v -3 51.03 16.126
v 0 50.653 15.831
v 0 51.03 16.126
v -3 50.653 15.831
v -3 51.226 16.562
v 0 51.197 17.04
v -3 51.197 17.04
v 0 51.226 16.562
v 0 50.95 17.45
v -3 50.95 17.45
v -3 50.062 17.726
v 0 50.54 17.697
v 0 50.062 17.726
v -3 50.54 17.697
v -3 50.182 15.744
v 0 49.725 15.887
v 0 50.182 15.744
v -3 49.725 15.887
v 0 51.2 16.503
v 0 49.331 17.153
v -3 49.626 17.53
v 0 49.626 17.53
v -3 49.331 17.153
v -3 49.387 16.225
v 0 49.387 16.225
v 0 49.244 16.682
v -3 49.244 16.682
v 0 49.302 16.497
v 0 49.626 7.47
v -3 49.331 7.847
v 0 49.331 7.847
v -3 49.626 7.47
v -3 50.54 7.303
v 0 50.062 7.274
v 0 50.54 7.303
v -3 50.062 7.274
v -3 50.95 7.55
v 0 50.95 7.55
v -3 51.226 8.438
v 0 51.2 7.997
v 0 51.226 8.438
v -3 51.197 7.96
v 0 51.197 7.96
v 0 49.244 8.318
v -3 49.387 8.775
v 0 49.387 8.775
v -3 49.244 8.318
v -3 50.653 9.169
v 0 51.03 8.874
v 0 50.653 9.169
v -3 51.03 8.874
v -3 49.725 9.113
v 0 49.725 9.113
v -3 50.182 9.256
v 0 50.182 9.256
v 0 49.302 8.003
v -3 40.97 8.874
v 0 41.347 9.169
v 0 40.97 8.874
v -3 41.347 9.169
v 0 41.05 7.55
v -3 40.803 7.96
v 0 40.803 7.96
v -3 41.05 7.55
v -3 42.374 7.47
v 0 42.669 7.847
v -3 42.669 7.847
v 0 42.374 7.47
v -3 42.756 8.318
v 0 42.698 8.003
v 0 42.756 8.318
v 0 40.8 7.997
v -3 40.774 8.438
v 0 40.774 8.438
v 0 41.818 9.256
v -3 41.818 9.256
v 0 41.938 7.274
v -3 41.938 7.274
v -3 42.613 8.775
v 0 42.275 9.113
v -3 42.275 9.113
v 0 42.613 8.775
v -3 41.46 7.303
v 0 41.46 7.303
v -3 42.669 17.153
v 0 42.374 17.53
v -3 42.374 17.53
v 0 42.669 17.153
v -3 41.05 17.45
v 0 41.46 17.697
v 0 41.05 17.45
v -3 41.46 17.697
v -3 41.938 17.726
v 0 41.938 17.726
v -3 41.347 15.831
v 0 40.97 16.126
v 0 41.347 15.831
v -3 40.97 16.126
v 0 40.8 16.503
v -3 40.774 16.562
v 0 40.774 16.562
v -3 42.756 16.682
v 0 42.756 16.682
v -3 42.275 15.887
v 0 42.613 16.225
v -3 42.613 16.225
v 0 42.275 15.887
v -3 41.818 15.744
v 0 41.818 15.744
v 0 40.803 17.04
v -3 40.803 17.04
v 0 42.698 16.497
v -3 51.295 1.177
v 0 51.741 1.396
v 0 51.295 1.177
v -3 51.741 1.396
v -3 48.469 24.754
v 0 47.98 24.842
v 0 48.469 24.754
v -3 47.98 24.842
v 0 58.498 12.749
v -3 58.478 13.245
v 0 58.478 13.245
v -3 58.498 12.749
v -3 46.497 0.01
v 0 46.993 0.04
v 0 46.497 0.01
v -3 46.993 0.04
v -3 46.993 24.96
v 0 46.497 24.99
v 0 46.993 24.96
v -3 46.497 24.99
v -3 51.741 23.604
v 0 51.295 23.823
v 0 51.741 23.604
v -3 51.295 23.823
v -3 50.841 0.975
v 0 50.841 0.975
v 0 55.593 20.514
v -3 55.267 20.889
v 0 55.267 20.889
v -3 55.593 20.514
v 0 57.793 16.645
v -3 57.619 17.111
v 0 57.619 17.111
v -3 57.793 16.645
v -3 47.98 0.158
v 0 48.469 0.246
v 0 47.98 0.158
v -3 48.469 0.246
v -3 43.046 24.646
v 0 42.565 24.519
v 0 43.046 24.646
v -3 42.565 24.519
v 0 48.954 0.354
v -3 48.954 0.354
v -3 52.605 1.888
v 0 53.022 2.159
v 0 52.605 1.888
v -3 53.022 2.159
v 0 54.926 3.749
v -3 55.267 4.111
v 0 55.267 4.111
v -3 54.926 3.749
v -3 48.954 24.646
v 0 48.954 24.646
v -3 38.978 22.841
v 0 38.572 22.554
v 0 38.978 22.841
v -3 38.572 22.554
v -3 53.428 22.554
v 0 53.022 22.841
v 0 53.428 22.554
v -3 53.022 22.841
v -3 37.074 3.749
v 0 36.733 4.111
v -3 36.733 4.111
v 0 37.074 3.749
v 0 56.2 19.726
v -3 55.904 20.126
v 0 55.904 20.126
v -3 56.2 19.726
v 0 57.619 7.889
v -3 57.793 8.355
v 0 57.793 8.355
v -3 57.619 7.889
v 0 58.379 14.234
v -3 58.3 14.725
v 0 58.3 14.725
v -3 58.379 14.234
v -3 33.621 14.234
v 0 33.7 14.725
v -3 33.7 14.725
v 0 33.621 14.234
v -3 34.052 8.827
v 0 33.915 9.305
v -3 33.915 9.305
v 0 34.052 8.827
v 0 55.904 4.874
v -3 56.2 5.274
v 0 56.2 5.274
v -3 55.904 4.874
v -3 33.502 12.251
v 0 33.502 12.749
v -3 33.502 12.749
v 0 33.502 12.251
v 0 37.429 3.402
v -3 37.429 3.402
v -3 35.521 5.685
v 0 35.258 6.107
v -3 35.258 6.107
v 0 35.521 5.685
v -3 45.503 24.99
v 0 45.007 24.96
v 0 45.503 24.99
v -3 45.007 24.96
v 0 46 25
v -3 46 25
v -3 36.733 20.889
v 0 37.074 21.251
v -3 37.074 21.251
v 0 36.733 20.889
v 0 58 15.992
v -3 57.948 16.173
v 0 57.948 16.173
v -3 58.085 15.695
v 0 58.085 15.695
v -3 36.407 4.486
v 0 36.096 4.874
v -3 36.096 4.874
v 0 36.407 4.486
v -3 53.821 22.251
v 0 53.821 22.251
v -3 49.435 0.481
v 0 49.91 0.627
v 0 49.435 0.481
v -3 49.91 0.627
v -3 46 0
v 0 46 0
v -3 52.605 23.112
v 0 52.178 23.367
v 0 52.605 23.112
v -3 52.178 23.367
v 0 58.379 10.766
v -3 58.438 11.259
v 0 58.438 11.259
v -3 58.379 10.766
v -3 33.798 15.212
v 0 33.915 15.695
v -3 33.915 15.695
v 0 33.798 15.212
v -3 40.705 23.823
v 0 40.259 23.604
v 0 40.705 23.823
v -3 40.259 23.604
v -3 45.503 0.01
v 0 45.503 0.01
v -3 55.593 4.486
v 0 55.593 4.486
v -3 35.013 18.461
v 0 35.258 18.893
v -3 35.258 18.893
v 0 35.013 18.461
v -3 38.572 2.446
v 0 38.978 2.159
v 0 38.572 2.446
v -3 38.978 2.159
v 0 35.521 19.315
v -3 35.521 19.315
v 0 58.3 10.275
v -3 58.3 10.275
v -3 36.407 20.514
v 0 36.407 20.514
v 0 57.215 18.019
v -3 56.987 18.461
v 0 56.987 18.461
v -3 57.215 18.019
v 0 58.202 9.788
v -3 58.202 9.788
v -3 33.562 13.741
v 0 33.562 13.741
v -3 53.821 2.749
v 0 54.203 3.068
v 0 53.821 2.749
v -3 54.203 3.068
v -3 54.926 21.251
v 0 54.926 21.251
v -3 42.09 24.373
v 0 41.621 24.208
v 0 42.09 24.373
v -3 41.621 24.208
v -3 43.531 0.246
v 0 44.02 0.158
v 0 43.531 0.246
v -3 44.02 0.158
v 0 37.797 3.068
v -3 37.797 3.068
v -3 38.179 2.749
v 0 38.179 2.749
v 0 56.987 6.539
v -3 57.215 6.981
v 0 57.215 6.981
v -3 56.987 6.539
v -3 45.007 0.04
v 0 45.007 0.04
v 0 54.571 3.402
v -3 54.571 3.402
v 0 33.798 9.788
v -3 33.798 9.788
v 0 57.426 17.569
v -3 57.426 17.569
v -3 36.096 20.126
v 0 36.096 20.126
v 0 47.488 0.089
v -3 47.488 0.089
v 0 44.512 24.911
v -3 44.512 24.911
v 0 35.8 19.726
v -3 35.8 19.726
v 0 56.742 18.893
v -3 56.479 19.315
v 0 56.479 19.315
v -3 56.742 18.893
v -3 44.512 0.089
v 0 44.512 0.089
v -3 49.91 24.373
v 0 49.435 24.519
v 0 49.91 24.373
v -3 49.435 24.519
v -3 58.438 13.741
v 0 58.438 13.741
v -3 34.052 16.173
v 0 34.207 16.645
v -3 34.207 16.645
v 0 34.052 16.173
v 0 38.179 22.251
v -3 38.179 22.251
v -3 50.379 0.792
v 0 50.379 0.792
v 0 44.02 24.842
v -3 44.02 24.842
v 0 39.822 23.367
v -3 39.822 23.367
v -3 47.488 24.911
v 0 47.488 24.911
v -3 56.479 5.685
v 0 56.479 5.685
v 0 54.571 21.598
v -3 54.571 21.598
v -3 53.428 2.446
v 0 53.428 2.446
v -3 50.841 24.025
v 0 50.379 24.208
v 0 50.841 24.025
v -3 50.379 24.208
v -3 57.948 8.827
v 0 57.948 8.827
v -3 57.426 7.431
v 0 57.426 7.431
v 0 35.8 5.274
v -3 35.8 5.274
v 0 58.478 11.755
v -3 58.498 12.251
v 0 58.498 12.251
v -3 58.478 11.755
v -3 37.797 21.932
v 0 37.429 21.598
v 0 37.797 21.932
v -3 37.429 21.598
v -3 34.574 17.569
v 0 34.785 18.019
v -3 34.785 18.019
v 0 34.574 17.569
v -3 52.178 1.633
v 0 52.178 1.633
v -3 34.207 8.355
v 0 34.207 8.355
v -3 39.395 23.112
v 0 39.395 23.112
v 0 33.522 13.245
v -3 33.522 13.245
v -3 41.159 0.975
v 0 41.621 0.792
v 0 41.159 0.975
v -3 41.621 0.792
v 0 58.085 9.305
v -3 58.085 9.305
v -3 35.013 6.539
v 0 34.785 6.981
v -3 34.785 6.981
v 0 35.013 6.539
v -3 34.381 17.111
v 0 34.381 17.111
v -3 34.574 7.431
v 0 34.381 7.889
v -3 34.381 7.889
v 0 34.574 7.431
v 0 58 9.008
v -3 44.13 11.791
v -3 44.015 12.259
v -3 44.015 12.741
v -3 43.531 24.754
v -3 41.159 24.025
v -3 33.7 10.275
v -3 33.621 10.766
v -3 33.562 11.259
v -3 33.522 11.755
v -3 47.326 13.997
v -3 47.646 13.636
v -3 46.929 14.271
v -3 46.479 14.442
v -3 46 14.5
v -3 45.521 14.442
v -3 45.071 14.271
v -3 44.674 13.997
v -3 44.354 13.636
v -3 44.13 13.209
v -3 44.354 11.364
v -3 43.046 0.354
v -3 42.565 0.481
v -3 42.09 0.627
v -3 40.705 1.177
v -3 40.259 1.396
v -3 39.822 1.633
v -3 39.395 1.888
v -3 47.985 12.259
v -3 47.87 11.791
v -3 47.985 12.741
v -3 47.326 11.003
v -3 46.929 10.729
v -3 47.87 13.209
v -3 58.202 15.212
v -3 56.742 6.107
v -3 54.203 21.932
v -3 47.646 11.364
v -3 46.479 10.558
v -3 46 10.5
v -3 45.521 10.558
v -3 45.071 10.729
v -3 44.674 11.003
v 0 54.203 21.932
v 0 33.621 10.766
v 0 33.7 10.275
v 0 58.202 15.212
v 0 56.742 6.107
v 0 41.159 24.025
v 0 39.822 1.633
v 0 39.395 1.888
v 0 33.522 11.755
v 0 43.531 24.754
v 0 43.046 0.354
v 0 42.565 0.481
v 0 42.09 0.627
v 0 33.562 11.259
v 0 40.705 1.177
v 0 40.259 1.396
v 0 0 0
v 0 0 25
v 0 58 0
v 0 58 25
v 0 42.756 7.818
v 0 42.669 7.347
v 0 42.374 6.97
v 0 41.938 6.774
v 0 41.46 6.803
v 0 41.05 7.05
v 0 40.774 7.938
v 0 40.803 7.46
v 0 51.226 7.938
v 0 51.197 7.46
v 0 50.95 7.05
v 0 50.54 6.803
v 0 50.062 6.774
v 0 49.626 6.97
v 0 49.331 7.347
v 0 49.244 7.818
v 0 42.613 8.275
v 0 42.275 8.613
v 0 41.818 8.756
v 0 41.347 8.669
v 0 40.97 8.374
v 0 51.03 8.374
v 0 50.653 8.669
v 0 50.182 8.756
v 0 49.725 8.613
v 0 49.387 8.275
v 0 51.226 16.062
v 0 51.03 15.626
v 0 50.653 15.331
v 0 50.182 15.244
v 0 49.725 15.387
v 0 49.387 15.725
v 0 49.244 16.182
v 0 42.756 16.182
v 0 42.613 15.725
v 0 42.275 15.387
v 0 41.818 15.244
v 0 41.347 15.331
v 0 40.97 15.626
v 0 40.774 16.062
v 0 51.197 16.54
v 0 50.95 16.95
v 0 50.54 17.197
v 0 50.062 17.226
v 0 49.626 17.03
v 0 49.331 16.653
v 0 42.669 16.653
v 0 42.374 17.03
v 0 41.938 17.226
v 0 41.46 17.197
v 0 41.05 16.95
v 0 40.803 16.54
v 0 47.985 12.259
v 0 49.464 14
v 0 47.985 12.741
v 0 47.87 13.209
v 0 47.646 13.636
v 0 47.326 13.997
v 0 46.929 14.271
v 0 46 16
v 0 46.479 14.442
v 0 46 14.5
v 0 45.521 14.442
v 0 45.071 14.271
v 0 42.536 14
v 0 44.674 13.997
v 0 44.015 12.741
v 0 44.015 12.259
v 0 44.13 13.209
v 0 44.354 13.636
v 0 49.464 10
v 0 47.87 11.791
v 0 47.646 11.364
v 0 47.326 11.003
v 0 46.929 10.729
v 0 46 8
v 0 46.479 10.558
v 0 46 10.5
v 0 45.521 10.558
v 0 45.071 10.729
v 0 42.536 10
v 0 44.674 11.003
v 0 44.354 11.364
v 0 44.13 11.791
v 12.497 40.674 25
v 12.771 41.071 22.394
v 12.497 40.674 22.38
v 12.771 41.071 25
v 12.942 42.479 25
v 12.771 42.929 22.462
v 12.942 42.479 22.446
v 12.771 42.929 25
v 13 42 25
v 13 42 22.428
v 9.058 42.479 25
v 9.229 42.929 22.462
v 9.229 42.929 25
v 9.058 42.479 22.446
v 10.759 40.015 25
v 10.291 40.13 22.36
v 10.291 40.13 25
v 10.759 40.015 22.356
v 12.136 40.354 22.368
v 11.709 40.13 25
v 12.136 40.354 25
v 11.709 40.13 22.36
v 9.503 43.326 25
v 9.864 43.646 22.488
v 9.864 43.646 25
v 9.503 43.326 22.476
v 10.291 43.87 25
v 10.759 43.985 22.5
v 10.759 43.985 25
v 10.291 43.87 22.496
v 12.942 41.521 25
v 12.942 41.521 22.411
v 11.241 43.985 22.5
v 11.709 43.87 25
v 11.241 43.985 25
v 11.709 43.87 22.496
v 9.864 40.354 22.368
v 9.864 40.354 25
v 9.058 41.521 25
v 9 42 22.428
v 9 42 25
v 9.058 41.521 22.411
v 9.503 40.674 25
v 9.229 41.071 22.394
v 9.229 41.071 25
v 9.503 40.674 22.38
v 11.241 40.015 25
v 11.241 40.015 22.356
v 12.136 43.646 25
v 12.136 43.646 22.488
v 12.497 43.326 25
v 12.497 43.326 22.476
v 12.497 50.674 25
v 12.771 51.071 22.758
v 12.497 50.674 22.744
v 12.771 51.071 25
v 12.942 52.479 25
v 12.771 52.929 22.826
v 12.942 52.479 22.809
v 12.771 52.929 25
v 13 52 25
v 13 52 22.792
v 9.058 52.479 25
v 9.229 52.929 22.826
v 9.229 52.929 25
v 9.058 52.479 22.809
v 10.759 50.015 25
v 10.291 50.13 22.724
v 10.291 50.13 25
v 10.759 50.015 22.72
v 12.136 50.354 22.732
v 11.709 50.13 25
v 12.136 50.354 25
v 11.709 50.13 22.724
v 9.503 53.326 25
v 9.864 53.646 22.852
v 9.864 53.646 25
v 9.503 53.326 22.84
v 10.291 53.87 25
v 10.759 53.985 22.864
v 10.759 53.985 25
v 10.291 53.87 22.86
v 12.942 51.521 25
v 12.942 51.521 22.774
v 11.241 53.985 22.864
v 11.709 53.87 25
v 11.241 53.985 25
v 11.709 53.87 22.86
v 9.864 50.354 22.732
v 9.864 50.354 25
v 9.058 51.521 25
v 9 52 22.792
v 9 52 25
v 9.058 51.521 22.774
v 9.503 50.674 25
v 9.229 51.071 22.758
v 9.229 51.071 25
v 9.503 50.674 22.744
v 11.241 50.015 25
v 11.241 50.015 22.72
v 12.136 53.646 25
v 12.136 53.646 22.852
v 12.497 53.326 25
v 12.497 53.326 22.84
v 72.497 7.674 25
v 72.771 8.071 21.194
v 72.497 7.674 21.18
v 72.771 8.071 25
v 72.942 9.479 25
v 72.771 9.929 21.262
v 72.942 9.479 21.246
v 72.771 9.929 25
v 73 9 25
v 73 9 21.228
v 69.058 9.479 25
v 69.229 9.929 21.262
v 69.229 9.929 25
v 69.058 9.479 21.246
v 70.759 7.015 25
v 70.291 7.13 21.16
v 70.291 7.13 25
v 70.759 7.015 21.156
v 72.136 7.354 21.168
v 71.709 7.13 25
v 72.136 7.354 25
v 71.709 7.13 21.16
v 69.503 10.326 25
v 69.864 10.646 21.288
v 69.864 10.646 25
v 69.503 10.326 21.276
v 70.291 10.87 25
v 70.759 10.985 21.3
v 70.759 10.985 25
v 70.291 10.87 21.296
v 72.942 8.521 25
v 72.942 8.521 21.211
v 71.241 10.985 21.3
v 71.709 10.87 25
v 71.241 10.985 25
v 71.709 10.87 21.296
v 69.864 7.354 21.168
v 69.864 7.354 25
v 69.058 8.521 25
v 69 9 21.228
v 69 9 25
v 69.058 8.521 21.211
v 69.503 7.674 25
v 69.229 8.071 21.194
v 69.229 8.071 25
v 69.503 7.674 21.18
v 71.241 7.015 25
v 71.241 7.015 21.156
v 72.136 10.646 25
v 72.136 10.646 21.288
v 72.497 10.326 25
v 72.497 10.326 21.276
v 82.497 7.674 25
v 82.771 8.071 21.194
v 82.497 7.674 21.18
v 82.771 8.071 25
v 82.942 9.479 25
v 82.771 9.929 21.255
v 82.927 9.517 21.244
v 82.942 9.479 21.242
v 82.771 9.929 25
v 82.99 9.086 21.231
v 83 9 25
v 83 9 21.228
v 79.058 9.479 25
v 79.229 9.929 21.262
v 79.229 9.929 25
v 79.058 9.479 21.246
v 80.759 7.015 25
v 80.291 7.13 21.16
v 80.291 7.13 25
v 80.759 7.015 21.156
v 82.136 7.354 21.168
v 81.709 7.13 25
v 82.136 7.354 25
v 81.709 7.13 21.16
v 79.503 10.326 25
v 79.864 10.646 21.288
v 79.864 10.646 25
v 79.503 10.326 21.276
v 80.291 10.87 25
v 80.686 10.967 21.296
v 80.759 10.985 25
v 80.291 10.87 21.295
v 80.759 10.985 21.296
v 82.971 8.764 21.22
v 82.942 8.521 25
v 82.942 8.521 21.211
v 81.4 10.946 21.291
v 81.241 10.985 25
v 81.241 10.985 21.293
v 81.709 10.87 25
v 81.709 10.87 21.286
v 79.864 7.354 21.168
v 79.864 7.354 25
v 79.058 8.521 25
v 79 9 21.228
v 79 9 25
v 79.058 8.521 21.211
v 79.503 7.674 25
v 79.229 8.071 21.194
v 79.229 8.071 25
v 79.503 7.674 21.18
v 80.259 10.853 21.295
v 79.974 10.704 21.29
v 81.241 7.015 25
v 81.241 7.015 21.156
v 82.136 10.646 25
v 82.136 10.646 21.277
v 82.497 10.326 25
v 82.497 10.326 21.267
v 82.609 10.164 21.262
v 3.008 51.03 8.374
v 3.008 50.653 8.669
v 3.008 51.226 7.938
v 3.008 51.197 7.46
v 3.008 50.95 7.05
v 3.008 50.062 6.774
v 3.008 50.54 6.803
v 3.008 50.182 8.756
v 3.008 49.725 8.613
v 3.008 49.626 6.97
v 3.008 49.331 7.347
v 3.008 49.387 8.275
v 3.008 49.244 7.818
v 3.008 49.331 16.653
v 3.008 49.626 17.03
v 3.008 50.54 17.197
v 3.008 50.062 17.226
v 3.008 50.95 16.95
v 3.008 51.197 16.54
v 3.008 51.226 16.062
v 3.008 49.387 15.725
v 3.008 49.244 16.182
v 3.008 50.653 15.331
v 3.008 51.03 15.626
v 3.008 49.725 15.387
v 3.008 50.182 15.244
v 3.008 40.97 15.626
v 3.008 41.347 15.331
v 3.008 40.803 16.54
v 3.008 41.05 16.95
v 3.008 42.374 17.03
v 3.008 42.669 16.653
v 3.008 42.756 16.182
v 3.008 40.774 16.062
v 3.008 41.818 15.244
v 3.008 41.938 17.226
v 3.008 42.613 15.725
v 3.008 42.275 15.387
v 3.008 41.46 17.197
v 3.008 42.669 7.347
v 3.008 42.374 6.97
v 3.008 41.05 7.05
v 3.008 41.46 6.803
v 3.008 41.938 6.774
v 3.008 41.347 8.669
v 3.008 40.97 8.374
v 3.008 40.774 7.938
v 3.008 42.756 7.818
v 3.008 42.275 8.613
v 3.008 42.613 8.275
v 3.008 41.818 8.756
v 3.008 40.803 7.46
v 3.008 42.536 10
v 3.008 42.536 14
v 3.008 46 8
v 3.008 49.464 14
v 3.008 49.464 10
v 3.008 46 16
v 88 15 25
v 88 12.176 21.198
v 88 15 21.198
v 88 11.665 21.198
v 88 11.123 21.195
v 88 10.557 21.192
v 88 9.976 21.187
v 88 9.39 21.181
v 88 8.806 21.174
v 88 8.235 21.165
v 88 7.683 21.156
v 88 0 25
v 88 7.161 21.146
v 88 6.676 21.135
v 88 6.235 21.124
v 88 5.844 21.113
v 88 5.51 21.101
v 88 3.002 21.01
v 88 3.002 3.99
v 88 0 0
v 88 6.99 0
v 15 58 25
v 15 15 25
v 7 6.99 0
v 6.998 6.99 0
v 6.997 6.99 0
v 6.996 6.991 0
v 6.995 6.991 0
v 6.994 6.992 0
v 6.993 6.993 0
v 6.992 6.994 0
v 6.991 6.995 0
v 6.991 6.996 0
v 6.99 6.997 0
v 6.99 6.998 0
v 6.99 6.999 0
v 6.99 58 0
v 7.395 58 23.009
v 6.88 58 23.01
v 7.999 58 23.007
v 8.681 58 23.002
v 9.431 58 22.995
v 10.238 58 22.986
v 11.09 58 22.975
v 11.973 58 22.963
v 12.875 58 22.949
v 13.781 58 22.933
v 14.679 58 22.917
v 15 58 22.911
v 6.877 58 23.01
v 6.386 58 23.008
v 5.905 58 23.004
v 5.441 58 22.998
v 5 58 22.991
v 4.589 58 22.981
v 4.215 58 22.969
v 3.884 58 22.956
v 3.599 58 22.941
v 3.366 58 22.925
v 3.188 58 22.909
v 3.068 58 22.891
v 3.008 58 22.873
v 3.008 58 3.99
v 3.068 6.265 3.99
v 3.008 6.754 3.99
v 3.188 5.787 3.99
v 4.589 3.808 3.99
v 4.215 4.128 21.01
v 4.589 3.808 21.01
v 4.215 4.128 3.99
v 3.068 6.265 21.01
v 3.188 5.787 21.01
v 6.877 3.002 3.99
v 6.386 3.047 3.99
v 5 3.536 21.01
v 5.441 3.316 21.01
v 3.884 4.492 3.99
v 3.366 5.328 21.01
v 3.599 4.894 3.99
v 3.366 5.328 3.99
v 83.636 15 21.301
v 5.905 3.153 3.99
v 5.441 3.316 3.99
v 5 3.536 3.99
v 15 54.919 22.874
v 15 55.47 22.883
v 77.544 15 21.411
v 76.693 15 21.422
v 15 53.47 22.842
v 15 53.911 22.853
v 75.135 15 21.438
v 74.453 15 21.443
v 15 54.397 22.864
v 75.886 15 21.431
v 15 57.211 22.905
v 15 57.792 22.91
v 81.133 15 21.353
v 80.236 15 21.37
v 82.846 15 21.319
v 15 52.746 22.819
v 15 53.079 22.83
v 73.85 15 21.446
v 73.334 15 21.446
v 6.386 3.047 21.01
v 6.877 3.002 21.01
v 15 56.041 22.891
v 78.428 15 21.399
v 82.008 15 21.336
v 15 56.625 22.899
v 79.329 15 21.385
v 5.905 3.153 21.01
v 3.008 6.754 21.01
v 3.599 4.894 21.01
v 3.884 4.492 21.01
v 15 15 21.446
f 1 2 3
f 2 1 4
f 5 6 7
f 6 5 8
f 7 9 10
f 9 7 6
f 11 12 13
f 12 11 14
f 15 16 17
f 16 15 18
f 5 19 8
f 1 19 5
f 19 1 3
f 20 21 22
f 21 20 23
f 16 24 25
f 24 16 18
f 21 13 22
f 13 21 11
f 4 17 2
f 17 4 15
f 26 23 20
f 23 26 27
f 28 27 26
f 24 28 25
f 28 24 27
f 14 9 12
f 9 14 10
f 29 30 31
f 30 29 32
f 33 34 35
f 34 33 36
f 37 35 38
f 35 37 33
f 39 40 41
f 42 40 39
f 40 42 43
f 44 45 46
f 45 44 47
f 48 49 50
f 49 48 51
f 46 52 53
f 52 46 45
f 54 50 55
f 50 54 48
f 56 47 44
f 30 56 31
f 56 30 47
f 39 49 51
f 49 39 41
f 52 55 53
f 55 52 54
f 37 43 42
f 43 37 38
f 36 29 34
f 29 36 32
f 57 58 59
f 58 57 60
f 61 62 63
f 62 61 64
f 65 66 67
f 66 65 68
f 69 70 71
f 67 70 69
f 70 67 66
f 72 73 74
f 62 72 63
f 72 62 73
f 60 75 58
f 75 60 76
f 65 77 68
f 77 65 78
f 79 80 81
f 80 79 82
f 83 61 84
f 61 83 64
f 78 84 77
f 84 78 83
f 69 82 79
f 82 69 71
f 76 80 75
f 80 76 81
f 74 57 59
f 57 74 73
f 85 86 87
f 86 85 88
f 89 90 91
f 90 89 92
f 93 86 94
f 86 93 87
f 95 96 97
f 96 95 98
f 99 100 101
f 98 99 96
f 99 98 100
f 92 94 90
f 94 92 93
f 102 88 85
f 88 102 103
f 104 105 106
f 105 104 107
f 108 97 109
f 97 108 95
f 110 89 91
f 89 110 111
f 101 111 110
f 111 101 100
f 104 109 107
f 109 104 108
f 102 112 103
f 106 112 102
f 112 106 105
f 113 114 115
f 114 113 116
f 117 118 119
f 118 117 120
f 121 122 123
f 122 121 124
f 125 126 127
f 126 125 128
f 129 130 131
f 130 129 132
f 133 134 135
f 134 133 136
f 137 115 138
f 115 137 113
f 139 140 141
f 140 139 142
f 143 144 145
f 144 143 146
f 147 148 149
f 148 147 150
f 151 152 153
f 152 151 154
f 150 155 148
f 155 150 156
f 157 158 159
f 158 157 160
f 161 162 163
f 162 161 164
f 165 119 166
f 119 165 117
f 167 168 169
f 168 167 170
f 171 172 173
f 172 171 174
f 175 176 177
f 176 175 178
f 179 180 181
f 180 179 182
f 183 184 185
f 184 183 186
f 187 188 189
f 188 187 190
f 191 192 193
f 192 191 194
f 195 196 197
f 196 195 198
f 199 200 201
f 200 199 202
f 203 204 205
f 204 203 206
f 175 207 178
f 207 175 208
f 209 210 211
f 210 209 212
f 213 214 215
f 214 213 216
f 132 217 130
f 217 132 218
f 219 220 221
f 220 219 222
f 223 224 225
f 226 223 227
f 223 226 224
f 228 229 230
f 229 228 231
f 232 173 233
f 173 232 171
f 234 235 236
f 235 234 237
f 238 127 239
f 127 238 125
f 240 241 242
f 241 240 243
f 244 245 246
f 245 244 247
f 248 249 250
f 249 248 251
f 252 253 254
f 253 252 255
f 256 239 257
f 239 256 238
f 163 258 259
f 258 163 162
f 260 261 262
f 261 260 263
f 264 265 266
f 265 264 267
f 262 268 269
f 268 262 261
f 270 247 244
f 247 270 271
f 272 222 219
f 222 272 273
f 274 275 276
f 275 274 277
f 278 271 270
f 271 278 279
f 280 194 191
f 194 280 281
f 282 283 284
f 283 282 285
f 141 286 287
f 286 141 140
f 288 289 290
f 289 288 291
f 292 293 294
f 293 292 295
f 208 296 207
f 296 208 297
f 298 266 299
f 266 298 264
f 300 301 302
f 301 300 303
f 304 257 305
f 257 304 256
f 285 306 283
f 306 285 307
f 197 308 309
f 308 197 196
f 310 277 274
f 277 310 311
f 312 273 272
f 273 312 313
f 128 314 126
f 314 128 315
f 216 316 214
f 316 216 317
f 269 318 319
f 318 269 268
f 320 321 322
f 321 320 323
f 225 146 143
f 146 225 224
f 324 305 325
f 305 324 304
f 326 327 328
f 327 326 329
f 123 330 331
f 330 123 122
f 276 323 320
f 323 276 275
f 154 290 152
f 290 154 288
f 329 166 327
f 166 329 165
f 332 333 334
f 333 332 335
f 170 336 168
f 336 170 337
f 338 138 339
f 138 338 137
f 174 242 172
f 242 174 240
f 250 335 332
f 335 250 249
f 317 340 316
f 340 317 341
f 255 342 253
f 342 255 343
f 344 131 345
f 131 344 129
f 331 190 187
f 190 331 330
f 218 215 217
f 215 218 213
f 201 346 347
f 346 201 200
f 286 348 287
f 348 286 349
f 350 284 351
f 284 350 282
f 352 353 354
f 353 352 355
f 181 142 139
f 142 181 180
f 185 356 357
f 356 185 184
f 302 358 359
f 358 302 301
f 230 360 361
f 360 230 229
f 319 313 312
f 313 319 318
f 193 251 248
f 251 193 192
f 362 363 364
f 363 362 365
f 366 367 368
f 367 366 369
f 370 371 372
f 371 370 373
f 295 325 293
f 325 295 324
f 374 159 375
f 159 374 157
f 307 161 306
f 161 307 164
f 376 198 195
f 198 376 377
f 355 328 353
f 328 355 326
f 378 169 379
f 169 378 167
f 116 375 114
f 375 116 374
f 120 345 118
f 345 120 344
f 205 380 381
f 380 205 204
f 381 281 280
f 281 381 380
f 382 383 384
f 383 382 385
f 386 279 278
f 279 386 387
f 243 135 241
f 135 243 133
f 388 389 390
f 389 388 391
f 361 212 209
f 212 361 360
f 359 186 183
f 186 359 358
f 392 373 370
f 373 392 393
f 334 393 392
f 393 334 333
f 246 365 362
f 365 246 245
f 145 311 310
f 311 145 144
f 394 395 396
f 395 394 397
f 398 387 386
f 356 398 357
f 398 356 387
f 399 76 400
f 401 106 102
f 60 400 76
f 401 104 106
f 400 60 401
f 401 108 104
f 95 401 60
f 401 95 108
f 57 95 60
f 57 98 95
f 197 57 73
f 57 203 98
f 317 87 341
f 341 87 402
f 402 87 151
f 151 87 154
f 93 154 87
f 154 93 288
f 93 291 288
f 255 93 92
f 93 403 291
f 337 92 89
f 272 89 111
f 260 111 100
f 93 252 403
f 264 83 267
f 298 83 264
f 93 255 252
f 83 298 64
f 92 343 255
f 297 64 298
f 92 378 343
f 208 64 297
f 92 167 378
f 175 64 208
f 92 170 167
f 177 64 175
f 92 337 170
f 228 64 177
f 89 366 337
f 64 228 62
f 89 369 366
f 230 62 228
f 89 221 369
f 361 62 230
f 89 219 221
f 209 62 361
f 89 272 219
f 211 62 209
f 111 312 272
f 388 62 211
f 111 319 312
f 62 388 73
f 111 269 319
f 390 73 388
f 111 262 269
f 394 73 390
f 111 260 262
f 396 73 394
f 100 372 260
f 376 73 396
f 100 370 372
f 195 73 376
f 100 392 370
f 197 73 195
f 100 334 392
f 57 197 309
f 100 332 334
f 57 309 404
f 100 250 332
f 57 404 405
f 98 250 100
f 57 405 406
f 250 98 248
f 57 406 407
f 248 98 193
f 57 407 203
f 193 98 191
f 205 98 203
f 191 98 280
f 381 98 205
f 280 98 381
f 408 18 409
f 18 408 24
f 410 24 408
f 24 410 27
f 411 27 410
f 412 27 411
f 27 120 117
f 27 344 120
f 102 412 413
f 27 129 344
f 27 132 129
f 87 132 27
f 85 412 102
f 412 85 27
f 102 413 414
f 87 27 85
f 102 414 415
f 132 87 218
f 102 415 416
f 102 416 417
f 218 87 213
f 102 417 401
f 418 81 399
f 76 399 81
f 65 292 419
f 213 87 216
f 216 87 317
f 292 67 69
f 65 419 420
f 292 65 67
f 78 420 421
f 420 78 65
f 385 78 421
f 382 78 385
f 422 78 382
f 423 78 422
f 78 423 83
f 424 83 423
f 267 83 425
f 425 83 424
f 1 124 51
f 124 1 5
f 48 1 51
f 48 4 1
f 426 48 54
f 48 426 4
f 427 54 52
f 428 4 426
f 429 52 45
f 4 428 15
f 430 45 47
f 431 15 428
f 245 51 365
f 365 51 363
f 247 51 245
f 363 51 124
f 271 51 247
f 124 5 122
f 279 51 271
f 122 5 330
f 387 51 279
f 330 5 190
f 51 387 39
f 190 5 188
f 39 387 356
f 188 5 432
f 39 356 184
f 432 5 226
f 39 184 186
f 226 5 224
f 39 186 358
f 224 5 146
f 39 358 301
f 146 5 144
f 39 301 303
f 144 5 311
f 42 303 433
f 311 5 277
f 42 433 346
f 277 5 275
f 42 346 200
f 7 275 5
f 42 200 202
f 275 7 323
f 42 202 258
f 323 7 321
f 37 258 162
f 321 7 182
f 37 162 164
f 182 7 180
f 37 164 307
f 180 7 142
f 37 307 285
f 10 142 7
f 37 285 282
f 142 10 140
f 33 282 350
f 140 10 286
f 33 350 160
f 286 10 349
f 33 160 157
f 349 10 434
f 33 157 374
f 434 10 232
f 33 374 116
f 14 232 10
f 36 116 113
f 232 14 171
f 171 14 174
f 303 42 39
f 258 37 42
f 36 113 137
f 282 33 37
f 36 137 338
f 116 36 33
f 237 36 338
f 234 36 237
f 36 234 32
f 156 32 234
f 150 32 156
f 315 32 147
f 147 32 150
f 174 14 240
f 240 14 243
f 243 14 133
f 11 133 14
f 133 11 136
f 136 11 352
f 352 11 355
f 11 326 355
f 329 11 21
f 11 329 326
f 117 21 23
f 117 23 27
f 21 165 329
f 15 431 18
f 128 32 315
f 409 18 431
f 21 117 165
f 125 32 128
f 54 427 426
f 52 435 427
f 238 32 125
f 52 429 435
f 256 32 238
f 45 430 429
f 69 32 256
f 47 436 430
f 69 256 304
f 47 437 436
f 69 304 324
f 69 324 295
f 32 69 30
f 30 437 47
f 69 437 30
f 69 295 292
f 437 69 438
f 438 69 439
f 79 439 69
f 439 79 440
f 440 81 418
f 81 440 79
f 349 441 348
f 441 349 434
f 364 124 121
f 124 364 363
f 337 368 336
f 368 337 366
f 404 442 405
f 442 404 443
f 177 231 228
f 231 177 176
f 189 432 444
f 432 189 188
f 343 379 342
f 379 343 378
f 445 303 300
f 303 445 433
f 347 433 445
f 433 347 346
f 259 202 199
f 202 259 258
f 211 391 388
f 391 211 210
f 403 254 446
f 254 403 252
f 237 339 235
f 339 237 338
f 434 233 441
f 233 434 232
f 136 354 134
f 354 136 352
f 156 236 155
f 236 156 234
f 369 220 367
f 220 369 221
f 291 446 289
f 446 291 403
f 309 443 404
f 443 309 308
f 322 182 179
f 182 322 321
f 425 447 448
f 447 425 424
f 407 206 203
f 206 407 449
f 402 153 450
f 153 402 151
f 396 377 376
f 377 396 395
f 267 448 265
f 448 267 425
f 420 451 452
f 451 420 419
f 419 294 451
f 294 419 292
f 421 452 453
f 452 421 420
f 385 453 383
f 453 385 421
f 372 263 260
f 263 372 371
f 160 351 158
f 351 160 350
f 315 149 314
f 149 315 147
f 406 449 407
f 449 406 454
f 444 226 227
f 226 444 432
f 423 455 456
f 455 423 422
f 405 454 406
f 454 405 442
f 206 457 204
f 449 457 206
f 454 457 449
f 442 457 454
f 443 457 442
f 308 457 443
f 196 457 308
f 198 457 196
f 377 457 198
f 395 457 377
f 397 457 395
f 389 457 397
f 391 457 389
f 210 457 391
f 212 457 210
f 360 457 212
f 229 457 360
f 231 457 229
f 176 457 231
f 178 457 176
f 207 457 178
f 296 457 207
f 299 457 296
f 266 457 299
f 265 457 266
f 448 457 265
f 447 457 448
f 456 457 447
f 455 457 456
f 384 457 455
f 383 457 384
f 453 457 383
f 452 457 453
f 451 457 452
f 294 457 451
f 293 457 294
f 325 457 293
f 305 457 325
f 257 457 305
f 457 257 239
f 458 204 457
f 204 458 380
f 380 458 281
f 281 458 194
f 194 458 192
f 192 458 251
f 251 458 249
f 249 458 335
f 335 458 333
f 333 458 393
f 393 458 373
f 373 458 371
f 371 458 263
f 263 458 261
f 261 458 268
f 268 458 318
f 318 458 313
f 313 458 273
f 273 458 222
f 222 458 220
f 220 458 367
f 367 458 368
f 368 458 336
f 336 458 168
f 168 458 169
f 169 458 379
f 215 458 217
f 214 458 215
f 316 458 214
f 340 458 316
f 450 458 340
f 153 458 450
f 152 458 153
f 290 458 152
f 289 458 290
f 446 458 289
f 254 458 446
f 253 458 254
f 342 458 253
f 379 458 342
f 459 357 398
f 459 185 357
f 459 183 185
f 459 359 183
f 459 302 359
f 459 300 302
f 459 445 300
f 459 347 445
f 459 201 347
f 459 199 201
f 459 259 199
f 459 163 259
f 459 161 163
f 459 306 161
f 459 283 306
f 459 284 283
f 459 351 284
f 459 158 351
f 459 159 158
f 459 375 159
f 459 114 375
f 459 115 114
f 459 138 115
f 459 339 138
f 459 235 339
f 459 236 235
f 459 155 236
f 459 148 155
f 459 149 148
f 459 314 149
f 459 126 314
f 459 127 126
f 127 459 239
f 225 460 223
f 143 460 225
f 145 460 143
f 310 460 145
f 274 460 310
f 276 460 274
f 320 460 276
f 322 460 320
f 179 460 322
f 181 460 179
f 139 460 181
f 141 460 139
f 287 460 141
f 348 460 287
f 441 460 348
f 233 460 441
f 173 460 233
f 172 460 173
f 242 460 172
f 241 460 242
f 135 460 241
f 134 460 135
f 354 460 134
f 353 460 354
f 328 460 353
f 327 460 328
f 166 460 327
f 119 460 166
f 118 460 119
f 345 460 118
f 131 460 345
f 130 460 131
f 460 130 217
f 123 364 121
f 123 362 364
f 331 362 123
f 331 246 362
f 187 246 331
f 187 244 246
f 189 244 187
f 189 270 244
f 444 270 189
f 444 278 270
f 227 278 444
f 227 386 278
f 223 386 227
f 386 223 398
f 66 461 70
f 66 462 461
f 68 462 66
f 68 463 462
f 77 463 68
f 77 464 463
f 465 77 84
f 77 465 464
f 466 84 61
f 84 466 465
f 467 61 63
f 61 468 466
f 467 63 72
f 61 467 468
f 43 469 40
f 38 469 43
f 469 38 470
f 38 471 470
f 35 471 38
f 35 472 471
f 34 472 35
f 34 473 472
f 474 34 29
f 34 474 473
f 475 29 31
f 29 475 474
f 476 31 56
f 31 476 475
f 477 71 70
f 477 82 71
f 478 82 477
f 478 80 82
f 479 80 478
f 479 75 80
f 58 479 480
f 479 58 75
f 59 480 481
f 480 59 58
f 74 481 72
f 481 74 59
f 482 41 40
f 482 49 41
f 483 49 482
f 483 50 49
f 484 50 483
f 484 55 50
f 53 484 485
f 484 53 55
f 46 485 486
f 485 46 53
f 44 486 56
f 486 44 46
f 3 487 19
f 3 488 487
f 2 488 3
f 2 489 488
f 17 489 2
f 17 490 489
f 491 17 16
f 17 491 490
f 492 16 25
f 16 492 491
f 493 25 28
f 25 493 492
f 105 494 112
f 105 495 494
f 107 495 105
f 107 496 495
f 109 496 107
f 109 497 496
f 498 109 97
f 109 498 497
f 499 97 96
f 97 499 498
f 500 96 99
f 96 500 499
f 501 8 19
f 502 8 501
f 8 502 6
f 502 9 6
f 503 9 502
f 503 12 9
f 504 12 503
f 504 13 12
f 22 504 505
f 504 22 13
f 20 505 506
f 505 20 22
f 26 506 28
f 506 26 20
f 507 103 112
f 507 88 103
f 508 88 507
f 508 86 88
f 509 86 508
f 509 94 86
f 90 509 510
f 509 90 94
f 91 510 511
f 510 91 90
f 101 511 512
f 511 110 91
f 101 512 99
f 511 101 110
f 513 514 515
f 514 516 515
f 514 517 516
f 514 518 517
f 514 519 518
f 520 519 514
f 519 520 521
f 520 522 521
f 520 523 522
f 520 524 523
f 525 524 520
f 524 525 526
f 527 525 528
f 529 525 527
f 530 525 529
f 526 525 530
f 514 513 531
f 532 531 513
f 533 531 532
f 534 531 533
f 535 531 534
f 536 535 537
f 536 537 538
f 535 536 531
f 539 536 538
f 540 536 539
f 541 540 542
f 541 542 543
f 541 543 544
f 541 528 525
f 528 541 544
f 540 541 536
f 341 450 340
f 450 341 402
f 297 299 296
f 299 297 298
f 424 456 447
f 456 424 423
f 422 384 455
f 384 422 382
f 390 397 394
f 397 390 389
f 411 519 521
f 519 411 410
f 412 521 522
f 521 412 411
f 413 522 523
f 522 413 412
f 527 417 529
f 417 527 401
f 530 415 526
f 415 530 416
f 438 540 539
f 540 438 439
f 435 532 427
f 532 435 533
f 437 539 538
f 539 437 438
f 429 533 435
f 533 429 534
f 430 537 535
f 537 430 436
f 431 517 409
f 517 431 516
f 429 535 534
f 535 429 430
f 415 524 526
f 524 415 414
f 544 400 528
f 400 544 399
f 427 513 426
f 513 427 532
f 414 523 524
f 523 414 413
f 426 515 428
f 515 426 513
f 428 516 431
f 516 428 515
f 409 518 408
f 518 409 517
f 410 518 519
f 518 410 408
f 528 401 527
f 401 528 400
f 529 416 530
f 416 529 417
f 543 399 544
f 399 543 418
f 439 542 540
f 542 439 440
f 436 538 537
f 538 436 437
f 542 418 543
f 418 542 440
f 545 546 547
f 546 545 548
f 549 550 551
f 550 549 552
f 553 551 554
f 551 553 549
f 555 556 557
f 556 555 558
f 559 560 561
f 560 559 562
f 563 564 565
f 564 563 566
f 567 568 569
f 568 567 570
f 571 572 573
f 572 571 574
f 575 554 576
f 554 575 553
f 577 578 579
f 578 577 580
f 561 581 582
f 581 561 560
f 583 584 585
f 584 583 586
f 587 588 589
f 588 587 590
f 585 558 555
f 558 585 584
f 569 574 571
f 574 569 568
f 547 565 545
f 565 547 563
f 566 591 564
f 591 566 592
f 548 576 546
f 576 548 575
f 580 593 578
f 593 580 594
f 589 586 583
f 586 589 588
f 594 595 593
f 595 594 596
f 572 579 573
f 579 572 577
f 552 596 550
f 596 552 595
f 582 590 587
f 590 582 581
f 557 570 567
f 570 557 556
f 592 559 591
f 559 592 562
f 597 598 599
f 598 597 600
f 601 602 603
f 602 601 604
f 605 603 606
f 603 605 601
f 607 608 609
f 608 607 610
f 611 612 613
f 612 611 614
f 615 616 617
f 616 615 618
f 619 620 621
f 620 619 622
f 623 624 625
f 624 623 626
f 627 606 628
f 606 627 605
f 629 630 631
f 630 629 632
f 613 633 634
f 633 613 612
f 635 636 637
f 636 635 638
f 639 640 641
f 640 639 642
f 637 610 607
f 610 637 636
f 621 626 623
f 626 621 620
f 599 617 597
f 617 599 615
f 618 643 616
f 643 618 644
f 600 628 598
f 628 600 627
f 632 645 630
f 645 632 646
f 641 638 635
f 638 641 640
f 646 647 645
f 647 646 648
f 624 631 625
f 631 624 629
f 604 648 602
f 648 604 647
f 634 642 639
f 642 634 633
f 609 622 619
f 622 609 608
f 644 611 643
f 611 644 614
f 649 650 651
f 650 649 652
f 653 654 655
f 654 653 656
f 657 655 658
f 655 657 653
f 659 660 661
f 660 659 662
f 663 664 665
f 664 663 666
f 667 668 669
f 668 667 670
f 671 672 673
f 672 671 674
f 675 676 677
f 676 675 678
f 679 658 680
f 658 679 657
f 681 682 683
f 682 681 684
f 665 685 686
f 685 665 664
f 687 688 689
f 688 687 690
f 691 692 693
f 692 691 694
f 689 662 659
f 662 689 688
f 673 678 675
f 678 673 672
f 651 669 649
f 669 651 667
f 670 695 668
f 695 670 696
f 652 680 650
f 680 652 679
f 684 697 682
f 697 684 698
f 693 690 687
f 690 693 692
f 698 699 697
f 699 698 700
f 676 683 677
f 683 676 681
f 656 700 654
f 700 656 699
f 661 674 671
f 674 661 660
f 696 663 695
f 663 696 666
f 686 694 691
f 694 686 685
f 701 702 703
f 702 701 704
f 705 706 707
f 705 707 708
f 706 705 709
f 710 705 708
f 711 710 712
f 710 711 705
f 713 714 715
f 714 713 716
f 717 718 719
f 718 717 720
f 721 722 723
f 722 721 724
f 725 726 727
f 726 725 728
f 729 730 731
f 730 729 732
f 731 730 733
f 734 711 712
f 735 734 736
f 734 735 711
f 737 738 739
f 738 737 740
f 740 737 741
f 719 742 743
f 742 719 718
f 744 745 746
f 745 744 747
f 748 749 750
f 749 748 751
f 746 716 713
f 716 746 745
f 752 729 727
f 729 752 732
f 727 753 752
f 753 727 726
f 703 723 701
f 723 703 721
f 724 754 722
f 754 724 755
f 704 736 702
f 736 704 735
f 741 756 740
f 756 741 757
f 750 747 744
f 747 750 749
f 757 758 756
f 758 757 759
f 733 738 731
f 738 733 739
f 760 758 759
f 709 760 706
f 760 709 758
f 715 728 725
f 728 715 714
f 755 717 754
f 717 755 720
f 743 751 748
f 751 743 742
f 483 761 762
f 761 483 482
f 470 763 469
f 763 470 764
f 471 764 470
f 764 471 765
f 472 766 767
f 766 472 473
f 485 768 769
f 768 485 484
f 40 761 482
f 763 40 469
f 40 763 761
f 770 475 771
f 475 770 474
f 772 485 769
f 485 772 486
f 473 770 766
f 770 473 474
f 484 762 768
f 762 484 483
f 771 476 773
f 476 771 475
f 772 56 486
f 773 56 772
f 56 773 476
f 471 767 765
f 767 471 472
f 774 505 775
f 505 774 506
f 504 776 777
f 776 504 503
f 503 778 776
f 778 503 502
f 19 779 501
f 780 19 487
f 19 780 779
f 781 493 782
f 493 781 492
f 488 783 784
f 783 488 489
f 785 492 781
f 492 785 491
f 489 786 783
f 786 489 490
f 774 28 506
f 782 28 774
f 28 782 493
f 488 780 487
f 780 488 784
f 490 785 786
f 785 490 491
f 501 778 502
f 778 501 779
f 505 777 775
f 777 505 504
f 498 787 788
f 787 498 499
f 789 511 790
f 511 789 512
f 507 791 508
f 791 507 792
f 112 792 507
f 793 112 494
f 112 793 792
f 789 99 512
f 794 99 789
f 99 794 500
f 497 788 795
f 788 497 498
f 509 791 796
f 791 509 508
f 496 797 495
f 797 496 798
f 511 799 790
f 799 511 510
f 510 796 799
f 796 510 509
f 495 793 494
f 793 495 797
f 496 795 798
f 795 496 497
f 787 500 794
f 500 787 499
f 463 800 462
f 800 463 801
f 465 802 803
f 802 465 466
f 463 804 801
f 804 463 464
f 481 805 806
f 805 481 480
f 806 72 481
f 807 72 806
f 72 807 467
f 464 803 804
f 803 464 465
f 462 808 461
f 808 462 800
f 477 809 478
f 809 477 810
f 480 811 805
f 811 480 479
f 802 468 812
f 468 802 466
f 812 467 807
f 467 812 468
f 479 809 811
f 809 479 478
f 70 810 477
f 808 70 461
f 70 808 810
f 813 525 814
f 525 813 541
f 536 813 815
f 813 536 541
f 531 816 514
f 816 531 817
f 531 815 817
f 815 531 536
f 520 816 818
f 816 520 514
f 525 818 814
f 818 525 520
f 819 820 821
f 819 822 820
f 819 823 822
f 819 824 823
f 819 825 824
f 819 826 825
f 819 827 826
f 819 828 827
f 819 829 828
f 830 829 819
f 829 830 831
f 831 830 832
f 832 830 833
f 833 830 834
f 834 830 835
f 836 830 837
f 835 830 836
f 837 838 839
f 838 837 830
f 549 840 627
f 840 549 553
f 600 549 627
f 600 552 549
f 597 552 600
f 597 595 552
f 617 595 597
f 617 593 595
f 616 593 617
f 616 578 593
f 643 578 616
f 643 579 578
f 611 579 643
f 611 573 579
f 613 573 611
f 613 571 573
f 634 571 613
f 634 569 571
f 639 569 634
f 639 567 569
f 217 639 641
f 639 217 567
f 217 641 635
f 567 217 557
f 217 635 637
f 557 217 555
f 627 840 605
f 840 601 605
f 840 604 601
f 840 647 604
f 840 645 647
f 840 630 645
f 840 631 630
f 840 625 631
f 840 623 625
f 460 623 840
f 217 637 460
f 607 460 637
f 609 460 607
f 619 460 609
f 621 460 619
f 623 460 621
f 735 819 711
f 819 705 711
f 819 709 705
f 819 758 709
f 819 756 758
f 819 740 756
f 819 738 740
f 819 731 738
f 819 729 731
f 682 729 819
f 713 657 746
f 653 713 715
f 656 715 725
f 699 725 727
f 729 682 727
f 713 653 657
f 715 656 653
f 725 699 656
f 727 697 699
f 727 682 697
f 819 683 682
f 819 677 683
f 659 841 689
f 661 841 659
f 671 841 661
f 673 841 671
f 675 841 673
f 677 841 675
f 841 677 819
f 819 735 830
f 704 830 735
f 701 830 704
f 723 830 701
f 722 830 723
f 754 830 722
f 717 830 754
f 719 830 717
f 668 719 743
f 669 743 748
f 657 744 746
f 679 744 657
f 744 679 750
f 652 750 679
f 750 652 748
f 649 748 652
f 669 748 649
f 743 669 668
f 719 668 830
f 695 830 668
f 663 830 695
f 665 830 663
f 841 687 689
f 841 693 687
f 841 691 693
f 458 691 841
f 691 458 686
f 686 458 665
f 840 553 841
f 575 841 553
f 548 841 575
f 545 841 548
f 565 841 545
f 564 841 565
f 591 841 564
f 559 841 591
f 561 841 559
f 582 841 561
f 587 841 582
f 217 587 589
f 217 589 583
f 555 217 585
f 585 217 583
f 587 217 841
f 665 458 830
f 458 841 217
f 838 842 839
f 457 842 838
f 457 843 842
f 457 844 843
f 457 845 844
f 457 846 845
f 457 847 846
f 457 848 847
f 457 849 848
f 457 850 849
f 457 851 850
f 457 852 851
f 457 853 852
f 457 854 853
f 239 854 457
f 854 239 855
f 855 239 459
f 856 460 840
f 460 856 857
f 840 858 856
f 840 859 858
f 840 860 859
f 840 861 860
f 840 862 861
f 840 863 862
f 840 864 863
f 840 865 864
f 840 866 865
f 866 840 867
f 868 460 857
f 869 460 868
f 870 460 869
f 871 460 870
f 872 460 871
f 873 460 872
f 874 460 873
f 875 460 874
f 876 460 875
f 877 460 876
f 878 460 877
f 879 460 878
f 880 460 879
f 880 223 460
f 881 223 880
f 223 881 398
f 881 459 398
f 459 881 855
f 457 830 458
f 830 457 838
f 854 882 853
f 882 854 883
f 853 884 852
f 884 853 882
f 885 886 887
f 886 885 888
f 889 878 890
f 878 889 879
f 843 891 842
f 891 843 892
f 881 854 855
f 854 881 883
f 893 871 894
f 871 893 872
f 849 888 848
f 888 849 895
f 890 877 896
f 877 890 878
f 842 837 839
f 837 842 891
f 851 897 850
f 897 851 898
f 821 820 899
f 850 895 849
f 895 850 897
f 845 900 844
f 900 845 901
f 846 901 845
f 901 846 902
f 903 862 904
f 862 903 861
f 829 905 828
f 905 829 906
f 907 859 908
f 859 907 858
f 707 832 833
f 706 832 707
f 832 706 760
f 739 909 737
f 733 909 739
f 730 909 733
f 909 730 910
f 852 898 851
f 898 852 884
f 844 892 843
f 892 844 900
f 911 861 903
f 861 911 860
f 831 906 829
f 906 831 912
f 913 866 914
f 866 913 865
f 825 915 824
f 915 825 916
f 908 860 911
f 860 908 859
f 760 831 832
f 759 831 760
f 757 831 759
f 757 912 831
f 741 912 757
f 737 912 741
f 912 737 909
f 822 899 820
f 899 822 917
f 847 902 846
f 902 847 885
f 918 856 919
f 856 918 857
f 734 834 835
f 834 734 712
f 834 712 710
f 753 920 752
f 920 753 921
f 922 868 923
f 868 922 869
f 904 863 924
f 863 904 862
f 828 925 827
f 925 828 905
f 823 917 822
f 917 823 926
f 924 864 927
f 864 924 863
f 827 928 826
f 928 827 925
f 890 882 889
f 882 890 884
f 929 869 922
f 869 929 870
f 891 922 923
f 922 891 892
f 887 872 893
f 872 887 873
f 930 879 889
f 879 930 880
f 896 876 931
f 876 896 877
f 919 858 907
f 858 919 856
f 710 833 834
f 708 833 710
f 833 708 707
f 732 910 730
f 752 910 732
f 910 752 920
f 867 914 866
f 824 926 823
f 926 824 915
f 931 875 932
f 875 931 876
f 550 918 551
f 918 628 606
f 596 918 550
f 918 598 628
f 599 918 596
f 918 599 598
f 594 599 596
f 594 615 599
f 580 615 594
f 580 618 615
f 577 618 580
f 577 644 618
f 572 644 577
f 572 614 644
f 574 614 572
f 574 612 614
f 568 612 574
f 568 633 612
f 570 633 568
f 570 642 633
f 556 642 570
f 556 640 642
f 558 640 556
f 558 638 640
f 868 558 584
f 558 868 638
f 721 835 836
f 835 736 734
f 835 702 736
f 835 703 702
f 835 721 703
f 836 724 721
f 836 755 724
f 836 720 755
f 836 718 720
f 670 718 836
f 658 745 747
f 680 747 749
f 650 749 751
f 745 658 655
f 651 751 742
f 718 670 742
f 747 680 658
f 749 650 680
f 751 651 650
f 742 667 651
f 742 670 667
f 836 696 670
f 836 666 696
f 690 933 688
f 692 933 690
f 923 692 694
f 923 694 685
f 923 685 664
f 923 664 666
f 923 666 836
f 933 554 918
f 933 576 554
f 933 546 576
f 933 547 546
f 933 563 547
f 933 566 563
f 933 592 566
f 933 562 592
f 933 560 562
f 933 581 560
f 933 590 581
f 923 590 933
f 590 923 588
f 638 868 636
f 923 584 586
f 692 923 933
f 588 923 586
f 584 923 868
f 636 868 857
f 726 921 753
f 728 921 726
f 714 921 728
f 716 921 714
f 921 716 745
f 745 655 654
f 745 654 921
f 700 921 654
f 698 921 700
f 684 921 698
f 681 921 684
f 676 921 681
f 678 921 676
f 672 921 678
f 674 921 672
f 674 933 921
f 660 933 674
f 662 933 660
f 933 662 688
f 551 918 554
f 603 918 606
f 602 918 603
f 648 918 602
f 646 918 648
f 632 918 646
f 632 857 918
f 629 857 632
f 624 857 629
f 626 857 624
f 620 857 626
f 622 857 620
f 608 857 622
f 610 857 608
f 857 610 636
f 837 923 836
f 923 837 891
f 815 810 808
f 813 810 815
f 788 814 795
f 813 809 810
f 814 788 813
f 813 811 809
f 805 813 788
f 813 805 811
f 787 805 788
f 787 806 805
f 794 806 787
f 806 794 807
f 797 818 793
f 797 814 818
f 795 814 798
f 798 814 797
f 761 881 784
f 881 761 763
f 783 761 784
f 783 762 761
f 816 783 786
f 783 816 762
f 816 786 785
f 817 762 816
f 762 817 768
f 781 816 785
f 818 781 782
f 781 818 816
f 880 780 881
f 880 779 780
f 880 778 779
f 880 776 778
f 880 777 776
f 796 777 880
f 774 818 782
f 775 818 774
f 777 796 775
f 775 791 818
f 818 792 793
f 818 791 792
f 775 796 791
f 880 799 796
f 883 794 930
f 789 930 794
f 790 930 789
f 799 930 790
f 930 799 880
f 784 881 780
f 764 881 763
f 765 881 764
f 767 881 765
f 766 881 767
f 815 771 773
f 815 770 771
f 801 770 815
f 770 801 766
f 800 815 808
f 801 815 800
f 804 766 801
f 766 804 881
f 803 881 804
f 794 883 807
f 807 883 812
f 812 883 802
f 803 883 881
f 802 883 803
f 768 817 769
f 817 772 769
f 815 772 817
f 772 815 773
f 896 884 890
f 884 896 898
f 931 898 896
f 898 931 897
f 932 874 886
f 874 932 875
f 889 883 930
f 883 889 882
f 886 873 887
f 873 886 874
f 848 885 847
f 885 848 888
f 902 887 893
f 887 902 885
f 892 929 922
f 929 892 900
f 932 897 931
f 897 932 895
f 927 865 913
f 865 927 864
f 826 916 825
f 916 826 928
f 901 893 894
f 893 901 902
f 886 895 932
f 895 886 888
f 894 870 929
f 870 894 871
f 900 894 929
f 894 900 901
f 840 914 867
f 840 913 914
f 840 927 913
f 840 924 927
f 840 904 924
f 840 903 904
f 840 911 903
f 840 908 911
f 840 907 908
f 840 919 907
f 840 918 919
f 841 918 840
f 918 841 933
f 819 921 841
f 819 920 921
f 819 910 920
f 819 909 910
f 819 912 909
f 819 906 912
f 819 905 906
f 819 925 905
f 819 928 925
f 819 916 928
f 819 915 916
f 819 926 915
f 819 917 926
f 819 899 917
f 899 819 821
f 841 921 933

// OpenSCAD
width=85;
height=55;
wall=3;
depth=21;
taper=4;
$fa=1/1;
$fs=1/2;
bissl=1/100;
d_bolt=4;
d_nut=8;
h_nut=4;
bcd=12;
n_screws=4;
d_circle=2;
back_plate=4;
module bracket() {
  difference() {
    cube([width+wall,height+wall,depth+back_plate]);
    hull() {
      for (t=[[taper+wall,taper+wall,0],[taper+wall+width,taper+wall,0],[taper+wall+width,taper+wall+height,0],[taper+wall,taper+wall+height,0],[taper+wall,taper+wall+height,2]]) translate(t) {
        translate([0,0,-bissl])cylinder(d1=0,d2=2*taper,h=taper);
        translate([0,0,taper-bissl]) cylinder(d=2*taper,h=depth-taper+2*bissl);
        *translate([0,0,depth-taper+bissl])cylinder(d2=0,d1=2*taper,h=taper);
      }
    }
    translate([wall+taper+8,wall+taper+8,depth-bissl])cube([width,height,back_plate+2*bissl]);
    translate([wall+taper,wall+taper,depth-bissl]) {
      for (tr=[[4,35,0],[4,45,0],[64,2,0],[74,2,0]]) translate(tr)cylinder(h=back_plate+2*bissl,d=4);
    }
    translate([0,46,wall/2+depth/2])rotate([0,90,0]) translate([0,0,-bissl]) {
    cylinder(h=h_nut+2*bissl, d=d_nut,$fn=6);
    for (i=[180/n_screws:360/n_screws:360]) rotate([0,0,i])translate([bcd/2,0,-0.01]) cylinder(h=2*wall+0.02,d=d_circle);
    }
  }
}
module rosette_mount() {
difference() {
  cylinder(h=wall,d=depth+back_plate);
  *translate([0,0,-bissl]) cylinder(h=h_nut+2*bissl, d=d_nut,$fn=6);
  translate([0,0,-bissl]) cylinder(h=wall+2*bissl, d=d_bolt);
  for (i=[180/n_screws:360/n_screws:360]) rotate([0,0,i])translate([bcd/2,0,-0.01]) cylinder(h=2*wall+0.02,d=d_circle);
}
}
translate([0,46,back_plate/2+depth/2])rotate([0,-90,0])rosette_mount();
bracket();
